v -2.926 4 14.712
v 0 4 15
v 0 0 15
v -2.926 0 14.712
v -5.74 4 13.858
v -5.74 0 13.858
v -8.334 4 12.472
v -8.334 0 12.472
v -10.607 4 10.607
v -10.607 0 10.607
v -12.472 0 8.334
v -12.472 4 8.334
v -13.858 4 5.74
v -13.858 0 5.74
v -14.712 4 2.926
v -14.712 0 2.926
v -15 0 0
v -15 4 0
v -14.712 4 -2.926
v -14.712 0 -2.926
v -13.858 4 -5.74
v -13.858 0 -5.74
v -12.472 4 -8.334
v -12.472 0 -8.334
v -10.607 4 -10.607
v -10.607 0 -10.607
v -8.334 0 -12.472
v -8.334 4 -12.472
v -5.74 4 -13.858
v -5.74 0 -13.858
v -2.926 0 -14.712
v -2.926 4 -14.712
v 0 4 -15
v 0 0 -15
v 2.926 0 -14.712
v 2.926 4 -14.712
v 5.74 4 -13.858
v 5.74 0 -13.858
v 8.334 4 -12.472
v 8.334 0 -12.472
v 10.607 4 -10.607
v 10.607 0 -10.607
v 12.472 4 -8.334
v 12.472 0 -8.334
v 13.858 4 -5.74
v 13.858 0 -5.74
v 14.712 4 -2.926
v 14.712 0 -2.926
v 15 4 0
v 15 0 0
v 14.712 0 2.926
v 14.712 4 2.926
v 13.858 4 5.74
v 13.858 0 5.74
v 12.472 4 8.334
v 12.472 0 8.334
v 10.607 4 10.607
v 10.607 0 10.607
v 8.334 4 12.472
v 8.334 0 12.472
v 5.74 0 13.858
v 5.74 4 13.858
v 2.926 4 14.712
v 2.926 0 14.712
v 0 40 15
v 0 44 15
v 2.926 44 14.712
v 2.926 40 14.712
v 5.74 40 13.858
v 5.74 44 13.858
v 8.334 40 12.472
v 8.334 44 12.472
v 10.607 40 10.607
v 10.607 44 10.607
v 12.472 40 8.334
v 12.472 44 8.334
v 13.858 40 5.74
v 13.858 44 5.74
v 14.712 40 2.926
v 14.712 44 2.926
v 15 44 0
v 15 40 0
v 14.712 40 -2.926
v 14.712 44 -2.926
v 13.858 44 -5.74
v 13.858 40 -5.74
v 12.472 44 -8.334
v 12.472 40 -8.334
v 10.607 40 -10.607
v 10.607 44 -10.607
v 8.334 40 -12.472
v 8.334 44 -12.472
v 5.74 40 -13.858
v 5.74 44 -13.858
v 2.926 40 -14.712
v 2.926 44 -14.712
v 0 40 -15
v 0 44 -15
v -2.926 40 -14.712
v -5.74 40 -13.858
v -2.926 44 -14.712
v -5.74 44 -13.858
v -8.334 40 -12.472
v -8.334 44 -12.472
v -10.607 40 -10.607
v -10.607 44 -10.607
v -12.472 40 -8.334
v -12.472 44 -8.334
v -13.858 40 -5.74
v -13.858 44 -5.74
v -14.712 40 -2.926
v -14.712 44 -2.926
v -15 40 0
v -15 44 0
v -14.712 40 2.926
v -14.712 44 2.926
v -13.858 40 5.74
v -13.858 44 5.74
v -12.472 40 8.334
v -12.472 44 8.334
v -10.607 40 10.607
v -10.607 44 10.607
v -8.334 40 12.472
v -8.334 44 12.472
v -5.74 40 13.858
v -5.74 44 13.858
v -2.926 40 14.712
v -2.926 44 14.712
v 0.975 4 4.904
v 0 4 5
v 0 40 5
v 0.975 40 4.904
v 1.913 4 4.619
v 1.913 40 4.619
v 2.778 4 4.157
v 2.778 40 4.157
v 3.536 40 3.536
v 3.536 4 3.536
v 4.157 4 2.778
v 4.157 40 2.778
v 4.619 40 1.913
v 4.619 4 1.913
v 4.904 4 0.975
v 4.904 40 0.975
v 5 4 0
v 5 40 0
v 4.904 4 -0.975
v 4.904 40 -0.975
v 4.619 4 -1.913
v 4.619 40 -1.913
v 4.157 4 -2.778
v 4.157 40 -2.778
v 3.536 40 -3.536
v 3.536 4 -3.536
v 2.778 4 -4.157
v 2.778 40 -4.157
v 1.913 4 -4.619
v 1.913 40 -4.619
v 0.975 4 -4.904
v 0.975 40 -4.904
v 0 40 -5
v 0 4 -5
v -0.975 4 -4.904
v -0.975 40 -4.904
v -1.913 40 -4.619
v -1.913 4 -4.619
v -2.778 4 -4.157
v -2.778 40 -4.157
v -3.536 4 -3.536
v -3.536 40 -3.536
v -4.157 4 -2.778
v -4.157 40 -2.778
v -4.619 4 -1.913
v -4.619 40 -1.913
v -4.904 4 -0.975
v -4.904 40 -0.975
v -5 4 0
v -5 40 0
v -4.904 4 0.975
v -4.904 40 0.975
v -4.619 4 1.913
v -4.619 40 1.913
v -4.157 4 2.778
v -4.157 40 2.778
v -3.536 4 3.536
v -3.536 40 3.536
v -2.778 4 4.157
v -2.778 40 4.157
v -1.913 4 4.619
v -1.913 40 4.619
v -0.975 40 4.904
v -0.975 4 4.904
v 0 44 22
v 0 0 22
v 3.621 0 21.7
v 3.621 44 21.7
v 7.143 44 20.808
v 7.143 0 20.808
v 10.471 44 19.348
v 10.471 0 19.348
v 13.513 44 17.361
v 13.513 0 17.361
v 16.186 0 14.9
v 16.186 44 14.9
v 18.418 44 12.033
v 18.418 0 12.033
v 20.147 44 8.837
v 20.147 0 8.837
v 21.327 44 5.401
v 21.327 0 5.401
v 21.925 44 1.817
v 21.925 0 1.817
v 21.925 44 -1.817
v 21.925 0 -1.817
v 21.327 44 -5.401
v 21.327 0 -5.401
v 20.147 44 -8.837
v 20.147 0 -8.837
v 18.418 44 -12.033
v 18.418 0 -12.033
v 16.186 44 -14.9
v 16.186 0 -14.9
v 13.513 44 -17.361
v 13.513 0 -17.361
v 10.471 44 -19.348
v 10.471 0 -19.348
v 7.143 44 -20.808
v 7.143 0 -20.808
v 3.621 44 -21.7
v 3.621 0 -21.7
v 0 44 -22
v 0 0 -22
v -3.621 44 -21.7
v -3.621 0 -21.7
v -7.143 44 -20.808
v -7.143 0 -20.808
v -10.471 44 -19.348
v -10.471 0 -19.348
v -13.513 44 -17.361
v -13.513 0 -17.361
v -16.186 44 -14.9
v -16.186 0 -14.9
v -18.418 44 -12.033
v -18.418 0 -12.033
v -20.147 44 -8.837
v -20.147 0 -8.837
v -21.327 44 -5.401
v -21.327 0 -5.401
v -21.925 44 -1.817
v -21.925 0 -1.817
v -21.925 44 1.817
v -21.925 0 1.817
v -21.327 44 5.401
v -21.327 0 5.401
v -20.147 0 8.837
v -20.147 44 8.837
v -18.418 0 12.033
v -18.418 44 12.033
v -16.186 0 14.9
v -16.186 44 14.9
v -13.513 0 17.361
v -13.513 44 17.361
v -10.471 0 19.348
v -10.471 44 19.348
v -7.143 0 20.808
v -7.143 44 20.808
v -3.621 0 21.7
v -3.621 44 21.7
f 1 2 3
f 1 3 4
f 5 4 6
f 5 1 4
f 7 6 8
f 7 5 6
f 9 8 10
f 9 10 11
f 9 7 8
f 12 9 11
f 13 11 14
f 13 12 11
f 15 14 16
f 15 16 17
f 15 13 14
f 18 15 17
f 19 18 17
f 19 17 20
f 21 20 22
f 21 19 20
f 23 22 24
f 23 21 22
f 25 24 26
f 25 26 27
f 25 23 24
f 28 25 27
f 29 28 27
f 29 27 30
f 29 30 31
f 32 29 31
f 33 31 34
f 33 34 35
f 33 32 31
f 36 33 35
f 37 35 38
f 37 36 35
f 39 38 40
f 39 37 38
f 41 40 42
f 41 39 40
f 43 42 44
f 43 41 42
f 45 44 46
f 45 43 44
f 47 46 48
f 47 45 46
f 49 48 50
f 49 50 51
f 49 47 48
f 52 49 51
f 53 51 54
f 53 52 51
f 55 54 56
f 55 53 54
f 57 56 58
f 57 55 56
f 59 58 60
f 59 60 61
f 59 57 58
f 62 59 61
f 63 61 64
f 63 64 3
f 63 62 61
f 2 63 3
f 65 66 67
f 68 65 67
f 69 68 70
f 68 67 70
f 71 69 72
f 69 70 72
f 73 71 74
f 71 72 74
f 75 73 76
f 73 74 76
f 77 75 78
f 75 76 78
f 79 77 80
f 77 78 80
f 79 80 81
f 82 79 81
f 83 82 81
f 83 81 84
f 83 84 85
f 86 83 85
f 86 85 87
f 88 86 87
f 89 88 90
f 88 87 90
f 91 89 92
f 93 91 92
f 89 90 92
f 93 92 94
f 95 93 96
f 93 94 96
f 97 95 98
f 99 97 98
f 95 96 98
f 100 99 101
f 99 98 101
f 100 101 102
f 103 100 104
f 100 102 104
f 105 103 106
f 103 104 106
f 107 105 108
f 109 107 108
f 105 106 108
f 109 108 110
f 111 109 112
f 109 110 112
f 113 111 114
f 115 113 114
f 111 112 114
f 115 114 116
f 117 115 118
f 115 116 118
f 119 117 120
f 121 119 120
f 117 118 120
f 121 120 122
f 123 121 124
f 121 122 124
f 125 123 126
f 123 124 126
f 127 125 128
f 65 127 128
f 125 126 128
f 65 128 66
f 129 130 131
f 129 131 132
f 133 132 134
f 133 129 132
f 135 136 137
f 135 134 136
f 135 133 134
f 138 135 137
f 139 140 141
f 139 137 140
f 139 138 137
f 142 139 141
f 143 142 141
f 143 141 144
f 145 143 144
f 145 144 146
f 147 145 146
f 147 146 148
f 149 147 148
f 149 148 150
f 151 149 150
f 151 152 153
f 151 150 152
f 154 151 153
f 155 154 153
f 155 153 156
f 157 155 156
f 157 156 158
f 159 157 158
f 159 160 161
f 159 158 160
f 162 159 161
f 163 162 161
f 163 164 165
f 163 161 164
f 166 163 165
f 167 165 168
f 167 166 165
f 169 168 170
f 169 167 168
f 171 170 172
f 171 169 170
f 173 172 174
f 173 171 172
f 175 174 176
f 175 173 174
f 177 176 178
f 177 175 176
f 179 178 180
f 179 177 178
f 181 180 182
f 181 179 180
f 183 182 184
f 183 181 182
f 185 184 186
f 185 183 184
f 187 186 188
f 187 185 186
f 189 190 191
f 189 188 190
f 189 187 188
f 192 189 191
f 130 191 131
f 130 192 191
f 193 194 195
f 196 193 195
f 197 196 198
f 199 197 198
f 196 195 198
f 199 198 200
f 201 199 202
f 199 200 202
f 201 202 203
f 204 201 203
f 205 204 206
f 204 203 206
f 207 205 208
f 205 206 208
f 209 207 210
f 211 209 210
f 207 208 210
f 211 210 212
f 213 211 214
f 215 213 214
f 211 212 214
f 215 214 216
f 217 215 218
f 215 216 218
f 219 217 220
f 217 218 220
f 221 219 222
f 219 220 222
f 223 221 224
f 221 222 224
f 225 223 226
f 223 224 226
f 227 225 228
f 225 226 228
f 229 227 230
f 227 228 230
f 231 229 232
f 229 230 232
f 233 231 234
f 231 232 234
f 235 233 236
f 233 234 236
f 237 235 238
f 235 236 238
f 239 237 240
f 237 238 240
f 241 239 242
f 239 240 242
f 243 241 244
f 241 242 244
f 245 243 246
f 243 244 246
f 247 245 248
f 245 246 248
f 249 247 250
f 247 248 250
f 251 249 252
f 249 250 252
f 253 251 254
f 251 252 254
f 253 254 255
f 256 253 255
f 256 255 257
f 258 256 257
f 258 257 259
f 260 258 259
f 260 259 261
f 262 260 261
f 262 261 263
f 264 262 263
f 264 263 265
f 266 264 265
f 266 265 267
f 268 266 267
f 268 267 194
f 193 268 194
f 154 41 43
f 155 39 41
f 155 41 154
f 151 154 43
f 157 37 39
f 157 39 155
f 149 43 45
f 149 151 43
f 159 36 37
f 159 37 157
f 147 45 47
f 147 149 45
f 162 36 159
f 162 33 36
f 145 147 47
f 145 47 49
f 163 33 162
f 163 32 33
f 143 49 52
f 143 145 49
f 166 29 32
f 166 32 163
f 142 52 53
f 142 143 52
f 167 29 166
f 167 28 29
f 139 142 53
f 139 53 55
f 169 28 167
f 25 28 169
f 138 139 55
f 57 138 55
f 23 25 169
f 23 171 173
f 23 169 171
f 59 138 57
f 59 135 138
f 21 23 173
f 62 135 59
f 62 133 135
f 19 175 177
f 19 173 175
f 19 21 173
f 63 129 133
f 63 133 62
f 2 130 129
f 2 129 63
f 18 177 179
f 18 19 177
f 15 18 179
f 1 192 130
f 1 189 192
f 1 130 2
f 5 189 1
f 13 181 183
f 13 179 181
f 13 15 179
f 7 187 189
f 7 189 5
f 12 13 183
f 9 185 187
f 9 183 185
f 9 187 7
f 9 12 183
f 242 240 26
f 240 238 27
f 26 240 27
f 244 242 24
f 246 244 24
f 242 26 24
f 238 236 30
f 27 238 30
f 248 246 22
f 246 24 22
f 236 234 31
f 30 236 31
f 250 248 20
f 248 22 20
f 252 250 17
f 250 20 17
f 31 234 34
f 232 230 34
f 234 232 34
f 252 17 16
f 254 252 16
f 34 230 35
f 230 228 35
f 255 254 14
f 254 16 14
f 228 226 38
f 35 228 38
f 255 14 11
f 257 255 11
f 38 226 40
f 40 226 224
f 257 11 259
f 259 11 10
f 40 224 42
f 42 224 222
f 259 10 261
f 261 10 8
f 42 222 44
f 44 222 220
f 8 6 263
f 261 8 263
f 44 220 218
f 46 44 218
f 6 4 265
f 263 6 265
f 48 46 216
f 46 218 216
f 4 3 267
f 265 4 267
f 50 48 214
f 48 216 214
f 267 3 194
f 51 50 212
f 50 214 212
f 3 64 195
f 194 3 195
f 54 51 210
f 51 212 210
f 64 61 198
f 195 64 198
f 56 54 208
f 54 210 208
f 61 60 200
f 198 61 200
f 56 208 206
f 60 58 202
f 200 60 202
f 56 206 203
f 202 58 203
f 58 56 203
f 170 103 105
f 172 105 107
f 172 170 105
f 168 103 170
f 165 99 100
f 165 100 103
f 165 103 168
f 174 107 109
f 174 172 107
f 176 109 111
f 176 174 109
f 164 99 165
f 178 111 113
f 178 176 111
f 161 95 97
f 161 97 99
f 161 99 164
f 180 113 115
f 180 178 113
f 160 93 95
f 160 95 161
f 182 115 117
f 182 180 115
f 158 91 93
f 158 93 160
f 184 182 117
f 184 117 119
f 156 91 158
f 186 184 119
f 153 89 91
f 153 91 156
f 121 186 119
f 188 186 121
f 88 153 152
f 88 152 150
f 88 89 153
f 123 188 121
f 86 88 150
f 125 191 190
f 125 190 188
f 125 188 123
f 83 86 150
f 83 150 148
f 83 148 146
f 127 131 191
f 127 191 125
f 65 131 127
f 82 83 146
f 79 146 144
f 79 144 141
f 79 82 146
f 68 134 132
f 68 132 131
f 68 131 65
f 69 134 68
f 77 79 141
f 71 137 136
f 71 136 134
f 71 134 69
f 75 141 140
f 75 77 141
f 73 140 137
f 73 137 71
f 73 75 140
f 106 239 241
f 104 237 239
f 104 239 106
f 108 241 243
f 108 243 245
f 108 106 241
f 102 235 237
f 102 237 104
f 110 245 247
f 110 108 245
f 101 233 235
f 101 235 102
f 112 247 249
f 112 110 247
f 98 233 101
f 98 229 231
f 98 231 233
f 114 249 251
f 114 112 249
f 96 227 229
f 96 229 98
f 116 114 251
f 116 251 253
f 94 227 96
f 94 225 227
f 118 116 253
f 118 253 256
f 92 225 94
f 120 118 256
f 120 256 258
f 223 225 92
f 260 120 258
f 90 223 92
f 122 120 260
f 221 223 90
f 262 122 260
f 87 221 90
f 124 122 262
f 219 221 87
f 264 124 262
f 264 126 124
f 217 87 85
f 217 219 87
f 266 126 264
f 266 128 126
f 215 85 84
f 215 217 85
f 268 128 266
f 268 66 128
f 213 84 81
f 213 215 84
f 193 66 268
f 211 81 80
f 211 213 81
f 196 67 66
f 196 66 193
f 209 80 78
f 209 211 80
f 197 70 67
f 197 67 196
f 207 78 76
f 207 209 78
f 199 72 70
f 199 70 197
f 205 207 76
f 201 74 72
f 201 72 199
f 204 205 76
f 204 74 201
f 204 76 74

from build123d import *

# Parameters (mm, degrees)
SKETCH1_R           = 22
SKETCH1_R_2         = 5
BOSS_EXTRUDE1_DEPTH = 44
SKETCH2_R           = 15
CUT_EXTRUDE1_DEPTH  = 4
CUT_EXTRUDE2_START  = -4
SKETCH3_R           = 15
CUT_EXTRUDE2_DEPTH  = 4


with BuildPart() as part:
    # Sketch1 → Boss-Extrude1 (new body)
    with BuildSketch(Plane(origin=(0, 0, 0), x_dir=(1, 0, 0), z_dir=(0, 1, 0))):
        with Locations(Location((0, 0, 0), (0, 0, 270))):
            Circle(SKETCH1_R)
        with Locations(Location((0, 0, 0), (0, 0, 270))):
            Circle(SKETCH1_R_2, mode=Mode.SUBTRACT)
    extrude(amount=BOSS_EXTRUDE1_DEPTH)

    # Sketch2 → Cut-Extrude1 (cut)
    with BuildSketch(Plane(origin=(0, 44, 0), x_dir=(1, 0, 0), z_dir=(0, 1, 0))):
        with Locations(Location((0, 0, 0), (0, 0, 270))):
            Circle(SKETCH2_R)
    extrude(amount=-CUT_EXTRUDE1_DEPTH, mode=Mode.SUBTRACT)

    # Sketch3 → Cut-Extrude2 (cut)
    with BuildSketch(Plane.XZ.offset(CUT_EXTRUDE2_START)):
        with Locations(Location((0, 0, 0), (0, 0, 90))):
            Circle(SKETCH3_R)
    extrude(amount=CUT_EXTRUDE2_DEPTH, mode=Mode.SUBTRACT)


solid = part.part
